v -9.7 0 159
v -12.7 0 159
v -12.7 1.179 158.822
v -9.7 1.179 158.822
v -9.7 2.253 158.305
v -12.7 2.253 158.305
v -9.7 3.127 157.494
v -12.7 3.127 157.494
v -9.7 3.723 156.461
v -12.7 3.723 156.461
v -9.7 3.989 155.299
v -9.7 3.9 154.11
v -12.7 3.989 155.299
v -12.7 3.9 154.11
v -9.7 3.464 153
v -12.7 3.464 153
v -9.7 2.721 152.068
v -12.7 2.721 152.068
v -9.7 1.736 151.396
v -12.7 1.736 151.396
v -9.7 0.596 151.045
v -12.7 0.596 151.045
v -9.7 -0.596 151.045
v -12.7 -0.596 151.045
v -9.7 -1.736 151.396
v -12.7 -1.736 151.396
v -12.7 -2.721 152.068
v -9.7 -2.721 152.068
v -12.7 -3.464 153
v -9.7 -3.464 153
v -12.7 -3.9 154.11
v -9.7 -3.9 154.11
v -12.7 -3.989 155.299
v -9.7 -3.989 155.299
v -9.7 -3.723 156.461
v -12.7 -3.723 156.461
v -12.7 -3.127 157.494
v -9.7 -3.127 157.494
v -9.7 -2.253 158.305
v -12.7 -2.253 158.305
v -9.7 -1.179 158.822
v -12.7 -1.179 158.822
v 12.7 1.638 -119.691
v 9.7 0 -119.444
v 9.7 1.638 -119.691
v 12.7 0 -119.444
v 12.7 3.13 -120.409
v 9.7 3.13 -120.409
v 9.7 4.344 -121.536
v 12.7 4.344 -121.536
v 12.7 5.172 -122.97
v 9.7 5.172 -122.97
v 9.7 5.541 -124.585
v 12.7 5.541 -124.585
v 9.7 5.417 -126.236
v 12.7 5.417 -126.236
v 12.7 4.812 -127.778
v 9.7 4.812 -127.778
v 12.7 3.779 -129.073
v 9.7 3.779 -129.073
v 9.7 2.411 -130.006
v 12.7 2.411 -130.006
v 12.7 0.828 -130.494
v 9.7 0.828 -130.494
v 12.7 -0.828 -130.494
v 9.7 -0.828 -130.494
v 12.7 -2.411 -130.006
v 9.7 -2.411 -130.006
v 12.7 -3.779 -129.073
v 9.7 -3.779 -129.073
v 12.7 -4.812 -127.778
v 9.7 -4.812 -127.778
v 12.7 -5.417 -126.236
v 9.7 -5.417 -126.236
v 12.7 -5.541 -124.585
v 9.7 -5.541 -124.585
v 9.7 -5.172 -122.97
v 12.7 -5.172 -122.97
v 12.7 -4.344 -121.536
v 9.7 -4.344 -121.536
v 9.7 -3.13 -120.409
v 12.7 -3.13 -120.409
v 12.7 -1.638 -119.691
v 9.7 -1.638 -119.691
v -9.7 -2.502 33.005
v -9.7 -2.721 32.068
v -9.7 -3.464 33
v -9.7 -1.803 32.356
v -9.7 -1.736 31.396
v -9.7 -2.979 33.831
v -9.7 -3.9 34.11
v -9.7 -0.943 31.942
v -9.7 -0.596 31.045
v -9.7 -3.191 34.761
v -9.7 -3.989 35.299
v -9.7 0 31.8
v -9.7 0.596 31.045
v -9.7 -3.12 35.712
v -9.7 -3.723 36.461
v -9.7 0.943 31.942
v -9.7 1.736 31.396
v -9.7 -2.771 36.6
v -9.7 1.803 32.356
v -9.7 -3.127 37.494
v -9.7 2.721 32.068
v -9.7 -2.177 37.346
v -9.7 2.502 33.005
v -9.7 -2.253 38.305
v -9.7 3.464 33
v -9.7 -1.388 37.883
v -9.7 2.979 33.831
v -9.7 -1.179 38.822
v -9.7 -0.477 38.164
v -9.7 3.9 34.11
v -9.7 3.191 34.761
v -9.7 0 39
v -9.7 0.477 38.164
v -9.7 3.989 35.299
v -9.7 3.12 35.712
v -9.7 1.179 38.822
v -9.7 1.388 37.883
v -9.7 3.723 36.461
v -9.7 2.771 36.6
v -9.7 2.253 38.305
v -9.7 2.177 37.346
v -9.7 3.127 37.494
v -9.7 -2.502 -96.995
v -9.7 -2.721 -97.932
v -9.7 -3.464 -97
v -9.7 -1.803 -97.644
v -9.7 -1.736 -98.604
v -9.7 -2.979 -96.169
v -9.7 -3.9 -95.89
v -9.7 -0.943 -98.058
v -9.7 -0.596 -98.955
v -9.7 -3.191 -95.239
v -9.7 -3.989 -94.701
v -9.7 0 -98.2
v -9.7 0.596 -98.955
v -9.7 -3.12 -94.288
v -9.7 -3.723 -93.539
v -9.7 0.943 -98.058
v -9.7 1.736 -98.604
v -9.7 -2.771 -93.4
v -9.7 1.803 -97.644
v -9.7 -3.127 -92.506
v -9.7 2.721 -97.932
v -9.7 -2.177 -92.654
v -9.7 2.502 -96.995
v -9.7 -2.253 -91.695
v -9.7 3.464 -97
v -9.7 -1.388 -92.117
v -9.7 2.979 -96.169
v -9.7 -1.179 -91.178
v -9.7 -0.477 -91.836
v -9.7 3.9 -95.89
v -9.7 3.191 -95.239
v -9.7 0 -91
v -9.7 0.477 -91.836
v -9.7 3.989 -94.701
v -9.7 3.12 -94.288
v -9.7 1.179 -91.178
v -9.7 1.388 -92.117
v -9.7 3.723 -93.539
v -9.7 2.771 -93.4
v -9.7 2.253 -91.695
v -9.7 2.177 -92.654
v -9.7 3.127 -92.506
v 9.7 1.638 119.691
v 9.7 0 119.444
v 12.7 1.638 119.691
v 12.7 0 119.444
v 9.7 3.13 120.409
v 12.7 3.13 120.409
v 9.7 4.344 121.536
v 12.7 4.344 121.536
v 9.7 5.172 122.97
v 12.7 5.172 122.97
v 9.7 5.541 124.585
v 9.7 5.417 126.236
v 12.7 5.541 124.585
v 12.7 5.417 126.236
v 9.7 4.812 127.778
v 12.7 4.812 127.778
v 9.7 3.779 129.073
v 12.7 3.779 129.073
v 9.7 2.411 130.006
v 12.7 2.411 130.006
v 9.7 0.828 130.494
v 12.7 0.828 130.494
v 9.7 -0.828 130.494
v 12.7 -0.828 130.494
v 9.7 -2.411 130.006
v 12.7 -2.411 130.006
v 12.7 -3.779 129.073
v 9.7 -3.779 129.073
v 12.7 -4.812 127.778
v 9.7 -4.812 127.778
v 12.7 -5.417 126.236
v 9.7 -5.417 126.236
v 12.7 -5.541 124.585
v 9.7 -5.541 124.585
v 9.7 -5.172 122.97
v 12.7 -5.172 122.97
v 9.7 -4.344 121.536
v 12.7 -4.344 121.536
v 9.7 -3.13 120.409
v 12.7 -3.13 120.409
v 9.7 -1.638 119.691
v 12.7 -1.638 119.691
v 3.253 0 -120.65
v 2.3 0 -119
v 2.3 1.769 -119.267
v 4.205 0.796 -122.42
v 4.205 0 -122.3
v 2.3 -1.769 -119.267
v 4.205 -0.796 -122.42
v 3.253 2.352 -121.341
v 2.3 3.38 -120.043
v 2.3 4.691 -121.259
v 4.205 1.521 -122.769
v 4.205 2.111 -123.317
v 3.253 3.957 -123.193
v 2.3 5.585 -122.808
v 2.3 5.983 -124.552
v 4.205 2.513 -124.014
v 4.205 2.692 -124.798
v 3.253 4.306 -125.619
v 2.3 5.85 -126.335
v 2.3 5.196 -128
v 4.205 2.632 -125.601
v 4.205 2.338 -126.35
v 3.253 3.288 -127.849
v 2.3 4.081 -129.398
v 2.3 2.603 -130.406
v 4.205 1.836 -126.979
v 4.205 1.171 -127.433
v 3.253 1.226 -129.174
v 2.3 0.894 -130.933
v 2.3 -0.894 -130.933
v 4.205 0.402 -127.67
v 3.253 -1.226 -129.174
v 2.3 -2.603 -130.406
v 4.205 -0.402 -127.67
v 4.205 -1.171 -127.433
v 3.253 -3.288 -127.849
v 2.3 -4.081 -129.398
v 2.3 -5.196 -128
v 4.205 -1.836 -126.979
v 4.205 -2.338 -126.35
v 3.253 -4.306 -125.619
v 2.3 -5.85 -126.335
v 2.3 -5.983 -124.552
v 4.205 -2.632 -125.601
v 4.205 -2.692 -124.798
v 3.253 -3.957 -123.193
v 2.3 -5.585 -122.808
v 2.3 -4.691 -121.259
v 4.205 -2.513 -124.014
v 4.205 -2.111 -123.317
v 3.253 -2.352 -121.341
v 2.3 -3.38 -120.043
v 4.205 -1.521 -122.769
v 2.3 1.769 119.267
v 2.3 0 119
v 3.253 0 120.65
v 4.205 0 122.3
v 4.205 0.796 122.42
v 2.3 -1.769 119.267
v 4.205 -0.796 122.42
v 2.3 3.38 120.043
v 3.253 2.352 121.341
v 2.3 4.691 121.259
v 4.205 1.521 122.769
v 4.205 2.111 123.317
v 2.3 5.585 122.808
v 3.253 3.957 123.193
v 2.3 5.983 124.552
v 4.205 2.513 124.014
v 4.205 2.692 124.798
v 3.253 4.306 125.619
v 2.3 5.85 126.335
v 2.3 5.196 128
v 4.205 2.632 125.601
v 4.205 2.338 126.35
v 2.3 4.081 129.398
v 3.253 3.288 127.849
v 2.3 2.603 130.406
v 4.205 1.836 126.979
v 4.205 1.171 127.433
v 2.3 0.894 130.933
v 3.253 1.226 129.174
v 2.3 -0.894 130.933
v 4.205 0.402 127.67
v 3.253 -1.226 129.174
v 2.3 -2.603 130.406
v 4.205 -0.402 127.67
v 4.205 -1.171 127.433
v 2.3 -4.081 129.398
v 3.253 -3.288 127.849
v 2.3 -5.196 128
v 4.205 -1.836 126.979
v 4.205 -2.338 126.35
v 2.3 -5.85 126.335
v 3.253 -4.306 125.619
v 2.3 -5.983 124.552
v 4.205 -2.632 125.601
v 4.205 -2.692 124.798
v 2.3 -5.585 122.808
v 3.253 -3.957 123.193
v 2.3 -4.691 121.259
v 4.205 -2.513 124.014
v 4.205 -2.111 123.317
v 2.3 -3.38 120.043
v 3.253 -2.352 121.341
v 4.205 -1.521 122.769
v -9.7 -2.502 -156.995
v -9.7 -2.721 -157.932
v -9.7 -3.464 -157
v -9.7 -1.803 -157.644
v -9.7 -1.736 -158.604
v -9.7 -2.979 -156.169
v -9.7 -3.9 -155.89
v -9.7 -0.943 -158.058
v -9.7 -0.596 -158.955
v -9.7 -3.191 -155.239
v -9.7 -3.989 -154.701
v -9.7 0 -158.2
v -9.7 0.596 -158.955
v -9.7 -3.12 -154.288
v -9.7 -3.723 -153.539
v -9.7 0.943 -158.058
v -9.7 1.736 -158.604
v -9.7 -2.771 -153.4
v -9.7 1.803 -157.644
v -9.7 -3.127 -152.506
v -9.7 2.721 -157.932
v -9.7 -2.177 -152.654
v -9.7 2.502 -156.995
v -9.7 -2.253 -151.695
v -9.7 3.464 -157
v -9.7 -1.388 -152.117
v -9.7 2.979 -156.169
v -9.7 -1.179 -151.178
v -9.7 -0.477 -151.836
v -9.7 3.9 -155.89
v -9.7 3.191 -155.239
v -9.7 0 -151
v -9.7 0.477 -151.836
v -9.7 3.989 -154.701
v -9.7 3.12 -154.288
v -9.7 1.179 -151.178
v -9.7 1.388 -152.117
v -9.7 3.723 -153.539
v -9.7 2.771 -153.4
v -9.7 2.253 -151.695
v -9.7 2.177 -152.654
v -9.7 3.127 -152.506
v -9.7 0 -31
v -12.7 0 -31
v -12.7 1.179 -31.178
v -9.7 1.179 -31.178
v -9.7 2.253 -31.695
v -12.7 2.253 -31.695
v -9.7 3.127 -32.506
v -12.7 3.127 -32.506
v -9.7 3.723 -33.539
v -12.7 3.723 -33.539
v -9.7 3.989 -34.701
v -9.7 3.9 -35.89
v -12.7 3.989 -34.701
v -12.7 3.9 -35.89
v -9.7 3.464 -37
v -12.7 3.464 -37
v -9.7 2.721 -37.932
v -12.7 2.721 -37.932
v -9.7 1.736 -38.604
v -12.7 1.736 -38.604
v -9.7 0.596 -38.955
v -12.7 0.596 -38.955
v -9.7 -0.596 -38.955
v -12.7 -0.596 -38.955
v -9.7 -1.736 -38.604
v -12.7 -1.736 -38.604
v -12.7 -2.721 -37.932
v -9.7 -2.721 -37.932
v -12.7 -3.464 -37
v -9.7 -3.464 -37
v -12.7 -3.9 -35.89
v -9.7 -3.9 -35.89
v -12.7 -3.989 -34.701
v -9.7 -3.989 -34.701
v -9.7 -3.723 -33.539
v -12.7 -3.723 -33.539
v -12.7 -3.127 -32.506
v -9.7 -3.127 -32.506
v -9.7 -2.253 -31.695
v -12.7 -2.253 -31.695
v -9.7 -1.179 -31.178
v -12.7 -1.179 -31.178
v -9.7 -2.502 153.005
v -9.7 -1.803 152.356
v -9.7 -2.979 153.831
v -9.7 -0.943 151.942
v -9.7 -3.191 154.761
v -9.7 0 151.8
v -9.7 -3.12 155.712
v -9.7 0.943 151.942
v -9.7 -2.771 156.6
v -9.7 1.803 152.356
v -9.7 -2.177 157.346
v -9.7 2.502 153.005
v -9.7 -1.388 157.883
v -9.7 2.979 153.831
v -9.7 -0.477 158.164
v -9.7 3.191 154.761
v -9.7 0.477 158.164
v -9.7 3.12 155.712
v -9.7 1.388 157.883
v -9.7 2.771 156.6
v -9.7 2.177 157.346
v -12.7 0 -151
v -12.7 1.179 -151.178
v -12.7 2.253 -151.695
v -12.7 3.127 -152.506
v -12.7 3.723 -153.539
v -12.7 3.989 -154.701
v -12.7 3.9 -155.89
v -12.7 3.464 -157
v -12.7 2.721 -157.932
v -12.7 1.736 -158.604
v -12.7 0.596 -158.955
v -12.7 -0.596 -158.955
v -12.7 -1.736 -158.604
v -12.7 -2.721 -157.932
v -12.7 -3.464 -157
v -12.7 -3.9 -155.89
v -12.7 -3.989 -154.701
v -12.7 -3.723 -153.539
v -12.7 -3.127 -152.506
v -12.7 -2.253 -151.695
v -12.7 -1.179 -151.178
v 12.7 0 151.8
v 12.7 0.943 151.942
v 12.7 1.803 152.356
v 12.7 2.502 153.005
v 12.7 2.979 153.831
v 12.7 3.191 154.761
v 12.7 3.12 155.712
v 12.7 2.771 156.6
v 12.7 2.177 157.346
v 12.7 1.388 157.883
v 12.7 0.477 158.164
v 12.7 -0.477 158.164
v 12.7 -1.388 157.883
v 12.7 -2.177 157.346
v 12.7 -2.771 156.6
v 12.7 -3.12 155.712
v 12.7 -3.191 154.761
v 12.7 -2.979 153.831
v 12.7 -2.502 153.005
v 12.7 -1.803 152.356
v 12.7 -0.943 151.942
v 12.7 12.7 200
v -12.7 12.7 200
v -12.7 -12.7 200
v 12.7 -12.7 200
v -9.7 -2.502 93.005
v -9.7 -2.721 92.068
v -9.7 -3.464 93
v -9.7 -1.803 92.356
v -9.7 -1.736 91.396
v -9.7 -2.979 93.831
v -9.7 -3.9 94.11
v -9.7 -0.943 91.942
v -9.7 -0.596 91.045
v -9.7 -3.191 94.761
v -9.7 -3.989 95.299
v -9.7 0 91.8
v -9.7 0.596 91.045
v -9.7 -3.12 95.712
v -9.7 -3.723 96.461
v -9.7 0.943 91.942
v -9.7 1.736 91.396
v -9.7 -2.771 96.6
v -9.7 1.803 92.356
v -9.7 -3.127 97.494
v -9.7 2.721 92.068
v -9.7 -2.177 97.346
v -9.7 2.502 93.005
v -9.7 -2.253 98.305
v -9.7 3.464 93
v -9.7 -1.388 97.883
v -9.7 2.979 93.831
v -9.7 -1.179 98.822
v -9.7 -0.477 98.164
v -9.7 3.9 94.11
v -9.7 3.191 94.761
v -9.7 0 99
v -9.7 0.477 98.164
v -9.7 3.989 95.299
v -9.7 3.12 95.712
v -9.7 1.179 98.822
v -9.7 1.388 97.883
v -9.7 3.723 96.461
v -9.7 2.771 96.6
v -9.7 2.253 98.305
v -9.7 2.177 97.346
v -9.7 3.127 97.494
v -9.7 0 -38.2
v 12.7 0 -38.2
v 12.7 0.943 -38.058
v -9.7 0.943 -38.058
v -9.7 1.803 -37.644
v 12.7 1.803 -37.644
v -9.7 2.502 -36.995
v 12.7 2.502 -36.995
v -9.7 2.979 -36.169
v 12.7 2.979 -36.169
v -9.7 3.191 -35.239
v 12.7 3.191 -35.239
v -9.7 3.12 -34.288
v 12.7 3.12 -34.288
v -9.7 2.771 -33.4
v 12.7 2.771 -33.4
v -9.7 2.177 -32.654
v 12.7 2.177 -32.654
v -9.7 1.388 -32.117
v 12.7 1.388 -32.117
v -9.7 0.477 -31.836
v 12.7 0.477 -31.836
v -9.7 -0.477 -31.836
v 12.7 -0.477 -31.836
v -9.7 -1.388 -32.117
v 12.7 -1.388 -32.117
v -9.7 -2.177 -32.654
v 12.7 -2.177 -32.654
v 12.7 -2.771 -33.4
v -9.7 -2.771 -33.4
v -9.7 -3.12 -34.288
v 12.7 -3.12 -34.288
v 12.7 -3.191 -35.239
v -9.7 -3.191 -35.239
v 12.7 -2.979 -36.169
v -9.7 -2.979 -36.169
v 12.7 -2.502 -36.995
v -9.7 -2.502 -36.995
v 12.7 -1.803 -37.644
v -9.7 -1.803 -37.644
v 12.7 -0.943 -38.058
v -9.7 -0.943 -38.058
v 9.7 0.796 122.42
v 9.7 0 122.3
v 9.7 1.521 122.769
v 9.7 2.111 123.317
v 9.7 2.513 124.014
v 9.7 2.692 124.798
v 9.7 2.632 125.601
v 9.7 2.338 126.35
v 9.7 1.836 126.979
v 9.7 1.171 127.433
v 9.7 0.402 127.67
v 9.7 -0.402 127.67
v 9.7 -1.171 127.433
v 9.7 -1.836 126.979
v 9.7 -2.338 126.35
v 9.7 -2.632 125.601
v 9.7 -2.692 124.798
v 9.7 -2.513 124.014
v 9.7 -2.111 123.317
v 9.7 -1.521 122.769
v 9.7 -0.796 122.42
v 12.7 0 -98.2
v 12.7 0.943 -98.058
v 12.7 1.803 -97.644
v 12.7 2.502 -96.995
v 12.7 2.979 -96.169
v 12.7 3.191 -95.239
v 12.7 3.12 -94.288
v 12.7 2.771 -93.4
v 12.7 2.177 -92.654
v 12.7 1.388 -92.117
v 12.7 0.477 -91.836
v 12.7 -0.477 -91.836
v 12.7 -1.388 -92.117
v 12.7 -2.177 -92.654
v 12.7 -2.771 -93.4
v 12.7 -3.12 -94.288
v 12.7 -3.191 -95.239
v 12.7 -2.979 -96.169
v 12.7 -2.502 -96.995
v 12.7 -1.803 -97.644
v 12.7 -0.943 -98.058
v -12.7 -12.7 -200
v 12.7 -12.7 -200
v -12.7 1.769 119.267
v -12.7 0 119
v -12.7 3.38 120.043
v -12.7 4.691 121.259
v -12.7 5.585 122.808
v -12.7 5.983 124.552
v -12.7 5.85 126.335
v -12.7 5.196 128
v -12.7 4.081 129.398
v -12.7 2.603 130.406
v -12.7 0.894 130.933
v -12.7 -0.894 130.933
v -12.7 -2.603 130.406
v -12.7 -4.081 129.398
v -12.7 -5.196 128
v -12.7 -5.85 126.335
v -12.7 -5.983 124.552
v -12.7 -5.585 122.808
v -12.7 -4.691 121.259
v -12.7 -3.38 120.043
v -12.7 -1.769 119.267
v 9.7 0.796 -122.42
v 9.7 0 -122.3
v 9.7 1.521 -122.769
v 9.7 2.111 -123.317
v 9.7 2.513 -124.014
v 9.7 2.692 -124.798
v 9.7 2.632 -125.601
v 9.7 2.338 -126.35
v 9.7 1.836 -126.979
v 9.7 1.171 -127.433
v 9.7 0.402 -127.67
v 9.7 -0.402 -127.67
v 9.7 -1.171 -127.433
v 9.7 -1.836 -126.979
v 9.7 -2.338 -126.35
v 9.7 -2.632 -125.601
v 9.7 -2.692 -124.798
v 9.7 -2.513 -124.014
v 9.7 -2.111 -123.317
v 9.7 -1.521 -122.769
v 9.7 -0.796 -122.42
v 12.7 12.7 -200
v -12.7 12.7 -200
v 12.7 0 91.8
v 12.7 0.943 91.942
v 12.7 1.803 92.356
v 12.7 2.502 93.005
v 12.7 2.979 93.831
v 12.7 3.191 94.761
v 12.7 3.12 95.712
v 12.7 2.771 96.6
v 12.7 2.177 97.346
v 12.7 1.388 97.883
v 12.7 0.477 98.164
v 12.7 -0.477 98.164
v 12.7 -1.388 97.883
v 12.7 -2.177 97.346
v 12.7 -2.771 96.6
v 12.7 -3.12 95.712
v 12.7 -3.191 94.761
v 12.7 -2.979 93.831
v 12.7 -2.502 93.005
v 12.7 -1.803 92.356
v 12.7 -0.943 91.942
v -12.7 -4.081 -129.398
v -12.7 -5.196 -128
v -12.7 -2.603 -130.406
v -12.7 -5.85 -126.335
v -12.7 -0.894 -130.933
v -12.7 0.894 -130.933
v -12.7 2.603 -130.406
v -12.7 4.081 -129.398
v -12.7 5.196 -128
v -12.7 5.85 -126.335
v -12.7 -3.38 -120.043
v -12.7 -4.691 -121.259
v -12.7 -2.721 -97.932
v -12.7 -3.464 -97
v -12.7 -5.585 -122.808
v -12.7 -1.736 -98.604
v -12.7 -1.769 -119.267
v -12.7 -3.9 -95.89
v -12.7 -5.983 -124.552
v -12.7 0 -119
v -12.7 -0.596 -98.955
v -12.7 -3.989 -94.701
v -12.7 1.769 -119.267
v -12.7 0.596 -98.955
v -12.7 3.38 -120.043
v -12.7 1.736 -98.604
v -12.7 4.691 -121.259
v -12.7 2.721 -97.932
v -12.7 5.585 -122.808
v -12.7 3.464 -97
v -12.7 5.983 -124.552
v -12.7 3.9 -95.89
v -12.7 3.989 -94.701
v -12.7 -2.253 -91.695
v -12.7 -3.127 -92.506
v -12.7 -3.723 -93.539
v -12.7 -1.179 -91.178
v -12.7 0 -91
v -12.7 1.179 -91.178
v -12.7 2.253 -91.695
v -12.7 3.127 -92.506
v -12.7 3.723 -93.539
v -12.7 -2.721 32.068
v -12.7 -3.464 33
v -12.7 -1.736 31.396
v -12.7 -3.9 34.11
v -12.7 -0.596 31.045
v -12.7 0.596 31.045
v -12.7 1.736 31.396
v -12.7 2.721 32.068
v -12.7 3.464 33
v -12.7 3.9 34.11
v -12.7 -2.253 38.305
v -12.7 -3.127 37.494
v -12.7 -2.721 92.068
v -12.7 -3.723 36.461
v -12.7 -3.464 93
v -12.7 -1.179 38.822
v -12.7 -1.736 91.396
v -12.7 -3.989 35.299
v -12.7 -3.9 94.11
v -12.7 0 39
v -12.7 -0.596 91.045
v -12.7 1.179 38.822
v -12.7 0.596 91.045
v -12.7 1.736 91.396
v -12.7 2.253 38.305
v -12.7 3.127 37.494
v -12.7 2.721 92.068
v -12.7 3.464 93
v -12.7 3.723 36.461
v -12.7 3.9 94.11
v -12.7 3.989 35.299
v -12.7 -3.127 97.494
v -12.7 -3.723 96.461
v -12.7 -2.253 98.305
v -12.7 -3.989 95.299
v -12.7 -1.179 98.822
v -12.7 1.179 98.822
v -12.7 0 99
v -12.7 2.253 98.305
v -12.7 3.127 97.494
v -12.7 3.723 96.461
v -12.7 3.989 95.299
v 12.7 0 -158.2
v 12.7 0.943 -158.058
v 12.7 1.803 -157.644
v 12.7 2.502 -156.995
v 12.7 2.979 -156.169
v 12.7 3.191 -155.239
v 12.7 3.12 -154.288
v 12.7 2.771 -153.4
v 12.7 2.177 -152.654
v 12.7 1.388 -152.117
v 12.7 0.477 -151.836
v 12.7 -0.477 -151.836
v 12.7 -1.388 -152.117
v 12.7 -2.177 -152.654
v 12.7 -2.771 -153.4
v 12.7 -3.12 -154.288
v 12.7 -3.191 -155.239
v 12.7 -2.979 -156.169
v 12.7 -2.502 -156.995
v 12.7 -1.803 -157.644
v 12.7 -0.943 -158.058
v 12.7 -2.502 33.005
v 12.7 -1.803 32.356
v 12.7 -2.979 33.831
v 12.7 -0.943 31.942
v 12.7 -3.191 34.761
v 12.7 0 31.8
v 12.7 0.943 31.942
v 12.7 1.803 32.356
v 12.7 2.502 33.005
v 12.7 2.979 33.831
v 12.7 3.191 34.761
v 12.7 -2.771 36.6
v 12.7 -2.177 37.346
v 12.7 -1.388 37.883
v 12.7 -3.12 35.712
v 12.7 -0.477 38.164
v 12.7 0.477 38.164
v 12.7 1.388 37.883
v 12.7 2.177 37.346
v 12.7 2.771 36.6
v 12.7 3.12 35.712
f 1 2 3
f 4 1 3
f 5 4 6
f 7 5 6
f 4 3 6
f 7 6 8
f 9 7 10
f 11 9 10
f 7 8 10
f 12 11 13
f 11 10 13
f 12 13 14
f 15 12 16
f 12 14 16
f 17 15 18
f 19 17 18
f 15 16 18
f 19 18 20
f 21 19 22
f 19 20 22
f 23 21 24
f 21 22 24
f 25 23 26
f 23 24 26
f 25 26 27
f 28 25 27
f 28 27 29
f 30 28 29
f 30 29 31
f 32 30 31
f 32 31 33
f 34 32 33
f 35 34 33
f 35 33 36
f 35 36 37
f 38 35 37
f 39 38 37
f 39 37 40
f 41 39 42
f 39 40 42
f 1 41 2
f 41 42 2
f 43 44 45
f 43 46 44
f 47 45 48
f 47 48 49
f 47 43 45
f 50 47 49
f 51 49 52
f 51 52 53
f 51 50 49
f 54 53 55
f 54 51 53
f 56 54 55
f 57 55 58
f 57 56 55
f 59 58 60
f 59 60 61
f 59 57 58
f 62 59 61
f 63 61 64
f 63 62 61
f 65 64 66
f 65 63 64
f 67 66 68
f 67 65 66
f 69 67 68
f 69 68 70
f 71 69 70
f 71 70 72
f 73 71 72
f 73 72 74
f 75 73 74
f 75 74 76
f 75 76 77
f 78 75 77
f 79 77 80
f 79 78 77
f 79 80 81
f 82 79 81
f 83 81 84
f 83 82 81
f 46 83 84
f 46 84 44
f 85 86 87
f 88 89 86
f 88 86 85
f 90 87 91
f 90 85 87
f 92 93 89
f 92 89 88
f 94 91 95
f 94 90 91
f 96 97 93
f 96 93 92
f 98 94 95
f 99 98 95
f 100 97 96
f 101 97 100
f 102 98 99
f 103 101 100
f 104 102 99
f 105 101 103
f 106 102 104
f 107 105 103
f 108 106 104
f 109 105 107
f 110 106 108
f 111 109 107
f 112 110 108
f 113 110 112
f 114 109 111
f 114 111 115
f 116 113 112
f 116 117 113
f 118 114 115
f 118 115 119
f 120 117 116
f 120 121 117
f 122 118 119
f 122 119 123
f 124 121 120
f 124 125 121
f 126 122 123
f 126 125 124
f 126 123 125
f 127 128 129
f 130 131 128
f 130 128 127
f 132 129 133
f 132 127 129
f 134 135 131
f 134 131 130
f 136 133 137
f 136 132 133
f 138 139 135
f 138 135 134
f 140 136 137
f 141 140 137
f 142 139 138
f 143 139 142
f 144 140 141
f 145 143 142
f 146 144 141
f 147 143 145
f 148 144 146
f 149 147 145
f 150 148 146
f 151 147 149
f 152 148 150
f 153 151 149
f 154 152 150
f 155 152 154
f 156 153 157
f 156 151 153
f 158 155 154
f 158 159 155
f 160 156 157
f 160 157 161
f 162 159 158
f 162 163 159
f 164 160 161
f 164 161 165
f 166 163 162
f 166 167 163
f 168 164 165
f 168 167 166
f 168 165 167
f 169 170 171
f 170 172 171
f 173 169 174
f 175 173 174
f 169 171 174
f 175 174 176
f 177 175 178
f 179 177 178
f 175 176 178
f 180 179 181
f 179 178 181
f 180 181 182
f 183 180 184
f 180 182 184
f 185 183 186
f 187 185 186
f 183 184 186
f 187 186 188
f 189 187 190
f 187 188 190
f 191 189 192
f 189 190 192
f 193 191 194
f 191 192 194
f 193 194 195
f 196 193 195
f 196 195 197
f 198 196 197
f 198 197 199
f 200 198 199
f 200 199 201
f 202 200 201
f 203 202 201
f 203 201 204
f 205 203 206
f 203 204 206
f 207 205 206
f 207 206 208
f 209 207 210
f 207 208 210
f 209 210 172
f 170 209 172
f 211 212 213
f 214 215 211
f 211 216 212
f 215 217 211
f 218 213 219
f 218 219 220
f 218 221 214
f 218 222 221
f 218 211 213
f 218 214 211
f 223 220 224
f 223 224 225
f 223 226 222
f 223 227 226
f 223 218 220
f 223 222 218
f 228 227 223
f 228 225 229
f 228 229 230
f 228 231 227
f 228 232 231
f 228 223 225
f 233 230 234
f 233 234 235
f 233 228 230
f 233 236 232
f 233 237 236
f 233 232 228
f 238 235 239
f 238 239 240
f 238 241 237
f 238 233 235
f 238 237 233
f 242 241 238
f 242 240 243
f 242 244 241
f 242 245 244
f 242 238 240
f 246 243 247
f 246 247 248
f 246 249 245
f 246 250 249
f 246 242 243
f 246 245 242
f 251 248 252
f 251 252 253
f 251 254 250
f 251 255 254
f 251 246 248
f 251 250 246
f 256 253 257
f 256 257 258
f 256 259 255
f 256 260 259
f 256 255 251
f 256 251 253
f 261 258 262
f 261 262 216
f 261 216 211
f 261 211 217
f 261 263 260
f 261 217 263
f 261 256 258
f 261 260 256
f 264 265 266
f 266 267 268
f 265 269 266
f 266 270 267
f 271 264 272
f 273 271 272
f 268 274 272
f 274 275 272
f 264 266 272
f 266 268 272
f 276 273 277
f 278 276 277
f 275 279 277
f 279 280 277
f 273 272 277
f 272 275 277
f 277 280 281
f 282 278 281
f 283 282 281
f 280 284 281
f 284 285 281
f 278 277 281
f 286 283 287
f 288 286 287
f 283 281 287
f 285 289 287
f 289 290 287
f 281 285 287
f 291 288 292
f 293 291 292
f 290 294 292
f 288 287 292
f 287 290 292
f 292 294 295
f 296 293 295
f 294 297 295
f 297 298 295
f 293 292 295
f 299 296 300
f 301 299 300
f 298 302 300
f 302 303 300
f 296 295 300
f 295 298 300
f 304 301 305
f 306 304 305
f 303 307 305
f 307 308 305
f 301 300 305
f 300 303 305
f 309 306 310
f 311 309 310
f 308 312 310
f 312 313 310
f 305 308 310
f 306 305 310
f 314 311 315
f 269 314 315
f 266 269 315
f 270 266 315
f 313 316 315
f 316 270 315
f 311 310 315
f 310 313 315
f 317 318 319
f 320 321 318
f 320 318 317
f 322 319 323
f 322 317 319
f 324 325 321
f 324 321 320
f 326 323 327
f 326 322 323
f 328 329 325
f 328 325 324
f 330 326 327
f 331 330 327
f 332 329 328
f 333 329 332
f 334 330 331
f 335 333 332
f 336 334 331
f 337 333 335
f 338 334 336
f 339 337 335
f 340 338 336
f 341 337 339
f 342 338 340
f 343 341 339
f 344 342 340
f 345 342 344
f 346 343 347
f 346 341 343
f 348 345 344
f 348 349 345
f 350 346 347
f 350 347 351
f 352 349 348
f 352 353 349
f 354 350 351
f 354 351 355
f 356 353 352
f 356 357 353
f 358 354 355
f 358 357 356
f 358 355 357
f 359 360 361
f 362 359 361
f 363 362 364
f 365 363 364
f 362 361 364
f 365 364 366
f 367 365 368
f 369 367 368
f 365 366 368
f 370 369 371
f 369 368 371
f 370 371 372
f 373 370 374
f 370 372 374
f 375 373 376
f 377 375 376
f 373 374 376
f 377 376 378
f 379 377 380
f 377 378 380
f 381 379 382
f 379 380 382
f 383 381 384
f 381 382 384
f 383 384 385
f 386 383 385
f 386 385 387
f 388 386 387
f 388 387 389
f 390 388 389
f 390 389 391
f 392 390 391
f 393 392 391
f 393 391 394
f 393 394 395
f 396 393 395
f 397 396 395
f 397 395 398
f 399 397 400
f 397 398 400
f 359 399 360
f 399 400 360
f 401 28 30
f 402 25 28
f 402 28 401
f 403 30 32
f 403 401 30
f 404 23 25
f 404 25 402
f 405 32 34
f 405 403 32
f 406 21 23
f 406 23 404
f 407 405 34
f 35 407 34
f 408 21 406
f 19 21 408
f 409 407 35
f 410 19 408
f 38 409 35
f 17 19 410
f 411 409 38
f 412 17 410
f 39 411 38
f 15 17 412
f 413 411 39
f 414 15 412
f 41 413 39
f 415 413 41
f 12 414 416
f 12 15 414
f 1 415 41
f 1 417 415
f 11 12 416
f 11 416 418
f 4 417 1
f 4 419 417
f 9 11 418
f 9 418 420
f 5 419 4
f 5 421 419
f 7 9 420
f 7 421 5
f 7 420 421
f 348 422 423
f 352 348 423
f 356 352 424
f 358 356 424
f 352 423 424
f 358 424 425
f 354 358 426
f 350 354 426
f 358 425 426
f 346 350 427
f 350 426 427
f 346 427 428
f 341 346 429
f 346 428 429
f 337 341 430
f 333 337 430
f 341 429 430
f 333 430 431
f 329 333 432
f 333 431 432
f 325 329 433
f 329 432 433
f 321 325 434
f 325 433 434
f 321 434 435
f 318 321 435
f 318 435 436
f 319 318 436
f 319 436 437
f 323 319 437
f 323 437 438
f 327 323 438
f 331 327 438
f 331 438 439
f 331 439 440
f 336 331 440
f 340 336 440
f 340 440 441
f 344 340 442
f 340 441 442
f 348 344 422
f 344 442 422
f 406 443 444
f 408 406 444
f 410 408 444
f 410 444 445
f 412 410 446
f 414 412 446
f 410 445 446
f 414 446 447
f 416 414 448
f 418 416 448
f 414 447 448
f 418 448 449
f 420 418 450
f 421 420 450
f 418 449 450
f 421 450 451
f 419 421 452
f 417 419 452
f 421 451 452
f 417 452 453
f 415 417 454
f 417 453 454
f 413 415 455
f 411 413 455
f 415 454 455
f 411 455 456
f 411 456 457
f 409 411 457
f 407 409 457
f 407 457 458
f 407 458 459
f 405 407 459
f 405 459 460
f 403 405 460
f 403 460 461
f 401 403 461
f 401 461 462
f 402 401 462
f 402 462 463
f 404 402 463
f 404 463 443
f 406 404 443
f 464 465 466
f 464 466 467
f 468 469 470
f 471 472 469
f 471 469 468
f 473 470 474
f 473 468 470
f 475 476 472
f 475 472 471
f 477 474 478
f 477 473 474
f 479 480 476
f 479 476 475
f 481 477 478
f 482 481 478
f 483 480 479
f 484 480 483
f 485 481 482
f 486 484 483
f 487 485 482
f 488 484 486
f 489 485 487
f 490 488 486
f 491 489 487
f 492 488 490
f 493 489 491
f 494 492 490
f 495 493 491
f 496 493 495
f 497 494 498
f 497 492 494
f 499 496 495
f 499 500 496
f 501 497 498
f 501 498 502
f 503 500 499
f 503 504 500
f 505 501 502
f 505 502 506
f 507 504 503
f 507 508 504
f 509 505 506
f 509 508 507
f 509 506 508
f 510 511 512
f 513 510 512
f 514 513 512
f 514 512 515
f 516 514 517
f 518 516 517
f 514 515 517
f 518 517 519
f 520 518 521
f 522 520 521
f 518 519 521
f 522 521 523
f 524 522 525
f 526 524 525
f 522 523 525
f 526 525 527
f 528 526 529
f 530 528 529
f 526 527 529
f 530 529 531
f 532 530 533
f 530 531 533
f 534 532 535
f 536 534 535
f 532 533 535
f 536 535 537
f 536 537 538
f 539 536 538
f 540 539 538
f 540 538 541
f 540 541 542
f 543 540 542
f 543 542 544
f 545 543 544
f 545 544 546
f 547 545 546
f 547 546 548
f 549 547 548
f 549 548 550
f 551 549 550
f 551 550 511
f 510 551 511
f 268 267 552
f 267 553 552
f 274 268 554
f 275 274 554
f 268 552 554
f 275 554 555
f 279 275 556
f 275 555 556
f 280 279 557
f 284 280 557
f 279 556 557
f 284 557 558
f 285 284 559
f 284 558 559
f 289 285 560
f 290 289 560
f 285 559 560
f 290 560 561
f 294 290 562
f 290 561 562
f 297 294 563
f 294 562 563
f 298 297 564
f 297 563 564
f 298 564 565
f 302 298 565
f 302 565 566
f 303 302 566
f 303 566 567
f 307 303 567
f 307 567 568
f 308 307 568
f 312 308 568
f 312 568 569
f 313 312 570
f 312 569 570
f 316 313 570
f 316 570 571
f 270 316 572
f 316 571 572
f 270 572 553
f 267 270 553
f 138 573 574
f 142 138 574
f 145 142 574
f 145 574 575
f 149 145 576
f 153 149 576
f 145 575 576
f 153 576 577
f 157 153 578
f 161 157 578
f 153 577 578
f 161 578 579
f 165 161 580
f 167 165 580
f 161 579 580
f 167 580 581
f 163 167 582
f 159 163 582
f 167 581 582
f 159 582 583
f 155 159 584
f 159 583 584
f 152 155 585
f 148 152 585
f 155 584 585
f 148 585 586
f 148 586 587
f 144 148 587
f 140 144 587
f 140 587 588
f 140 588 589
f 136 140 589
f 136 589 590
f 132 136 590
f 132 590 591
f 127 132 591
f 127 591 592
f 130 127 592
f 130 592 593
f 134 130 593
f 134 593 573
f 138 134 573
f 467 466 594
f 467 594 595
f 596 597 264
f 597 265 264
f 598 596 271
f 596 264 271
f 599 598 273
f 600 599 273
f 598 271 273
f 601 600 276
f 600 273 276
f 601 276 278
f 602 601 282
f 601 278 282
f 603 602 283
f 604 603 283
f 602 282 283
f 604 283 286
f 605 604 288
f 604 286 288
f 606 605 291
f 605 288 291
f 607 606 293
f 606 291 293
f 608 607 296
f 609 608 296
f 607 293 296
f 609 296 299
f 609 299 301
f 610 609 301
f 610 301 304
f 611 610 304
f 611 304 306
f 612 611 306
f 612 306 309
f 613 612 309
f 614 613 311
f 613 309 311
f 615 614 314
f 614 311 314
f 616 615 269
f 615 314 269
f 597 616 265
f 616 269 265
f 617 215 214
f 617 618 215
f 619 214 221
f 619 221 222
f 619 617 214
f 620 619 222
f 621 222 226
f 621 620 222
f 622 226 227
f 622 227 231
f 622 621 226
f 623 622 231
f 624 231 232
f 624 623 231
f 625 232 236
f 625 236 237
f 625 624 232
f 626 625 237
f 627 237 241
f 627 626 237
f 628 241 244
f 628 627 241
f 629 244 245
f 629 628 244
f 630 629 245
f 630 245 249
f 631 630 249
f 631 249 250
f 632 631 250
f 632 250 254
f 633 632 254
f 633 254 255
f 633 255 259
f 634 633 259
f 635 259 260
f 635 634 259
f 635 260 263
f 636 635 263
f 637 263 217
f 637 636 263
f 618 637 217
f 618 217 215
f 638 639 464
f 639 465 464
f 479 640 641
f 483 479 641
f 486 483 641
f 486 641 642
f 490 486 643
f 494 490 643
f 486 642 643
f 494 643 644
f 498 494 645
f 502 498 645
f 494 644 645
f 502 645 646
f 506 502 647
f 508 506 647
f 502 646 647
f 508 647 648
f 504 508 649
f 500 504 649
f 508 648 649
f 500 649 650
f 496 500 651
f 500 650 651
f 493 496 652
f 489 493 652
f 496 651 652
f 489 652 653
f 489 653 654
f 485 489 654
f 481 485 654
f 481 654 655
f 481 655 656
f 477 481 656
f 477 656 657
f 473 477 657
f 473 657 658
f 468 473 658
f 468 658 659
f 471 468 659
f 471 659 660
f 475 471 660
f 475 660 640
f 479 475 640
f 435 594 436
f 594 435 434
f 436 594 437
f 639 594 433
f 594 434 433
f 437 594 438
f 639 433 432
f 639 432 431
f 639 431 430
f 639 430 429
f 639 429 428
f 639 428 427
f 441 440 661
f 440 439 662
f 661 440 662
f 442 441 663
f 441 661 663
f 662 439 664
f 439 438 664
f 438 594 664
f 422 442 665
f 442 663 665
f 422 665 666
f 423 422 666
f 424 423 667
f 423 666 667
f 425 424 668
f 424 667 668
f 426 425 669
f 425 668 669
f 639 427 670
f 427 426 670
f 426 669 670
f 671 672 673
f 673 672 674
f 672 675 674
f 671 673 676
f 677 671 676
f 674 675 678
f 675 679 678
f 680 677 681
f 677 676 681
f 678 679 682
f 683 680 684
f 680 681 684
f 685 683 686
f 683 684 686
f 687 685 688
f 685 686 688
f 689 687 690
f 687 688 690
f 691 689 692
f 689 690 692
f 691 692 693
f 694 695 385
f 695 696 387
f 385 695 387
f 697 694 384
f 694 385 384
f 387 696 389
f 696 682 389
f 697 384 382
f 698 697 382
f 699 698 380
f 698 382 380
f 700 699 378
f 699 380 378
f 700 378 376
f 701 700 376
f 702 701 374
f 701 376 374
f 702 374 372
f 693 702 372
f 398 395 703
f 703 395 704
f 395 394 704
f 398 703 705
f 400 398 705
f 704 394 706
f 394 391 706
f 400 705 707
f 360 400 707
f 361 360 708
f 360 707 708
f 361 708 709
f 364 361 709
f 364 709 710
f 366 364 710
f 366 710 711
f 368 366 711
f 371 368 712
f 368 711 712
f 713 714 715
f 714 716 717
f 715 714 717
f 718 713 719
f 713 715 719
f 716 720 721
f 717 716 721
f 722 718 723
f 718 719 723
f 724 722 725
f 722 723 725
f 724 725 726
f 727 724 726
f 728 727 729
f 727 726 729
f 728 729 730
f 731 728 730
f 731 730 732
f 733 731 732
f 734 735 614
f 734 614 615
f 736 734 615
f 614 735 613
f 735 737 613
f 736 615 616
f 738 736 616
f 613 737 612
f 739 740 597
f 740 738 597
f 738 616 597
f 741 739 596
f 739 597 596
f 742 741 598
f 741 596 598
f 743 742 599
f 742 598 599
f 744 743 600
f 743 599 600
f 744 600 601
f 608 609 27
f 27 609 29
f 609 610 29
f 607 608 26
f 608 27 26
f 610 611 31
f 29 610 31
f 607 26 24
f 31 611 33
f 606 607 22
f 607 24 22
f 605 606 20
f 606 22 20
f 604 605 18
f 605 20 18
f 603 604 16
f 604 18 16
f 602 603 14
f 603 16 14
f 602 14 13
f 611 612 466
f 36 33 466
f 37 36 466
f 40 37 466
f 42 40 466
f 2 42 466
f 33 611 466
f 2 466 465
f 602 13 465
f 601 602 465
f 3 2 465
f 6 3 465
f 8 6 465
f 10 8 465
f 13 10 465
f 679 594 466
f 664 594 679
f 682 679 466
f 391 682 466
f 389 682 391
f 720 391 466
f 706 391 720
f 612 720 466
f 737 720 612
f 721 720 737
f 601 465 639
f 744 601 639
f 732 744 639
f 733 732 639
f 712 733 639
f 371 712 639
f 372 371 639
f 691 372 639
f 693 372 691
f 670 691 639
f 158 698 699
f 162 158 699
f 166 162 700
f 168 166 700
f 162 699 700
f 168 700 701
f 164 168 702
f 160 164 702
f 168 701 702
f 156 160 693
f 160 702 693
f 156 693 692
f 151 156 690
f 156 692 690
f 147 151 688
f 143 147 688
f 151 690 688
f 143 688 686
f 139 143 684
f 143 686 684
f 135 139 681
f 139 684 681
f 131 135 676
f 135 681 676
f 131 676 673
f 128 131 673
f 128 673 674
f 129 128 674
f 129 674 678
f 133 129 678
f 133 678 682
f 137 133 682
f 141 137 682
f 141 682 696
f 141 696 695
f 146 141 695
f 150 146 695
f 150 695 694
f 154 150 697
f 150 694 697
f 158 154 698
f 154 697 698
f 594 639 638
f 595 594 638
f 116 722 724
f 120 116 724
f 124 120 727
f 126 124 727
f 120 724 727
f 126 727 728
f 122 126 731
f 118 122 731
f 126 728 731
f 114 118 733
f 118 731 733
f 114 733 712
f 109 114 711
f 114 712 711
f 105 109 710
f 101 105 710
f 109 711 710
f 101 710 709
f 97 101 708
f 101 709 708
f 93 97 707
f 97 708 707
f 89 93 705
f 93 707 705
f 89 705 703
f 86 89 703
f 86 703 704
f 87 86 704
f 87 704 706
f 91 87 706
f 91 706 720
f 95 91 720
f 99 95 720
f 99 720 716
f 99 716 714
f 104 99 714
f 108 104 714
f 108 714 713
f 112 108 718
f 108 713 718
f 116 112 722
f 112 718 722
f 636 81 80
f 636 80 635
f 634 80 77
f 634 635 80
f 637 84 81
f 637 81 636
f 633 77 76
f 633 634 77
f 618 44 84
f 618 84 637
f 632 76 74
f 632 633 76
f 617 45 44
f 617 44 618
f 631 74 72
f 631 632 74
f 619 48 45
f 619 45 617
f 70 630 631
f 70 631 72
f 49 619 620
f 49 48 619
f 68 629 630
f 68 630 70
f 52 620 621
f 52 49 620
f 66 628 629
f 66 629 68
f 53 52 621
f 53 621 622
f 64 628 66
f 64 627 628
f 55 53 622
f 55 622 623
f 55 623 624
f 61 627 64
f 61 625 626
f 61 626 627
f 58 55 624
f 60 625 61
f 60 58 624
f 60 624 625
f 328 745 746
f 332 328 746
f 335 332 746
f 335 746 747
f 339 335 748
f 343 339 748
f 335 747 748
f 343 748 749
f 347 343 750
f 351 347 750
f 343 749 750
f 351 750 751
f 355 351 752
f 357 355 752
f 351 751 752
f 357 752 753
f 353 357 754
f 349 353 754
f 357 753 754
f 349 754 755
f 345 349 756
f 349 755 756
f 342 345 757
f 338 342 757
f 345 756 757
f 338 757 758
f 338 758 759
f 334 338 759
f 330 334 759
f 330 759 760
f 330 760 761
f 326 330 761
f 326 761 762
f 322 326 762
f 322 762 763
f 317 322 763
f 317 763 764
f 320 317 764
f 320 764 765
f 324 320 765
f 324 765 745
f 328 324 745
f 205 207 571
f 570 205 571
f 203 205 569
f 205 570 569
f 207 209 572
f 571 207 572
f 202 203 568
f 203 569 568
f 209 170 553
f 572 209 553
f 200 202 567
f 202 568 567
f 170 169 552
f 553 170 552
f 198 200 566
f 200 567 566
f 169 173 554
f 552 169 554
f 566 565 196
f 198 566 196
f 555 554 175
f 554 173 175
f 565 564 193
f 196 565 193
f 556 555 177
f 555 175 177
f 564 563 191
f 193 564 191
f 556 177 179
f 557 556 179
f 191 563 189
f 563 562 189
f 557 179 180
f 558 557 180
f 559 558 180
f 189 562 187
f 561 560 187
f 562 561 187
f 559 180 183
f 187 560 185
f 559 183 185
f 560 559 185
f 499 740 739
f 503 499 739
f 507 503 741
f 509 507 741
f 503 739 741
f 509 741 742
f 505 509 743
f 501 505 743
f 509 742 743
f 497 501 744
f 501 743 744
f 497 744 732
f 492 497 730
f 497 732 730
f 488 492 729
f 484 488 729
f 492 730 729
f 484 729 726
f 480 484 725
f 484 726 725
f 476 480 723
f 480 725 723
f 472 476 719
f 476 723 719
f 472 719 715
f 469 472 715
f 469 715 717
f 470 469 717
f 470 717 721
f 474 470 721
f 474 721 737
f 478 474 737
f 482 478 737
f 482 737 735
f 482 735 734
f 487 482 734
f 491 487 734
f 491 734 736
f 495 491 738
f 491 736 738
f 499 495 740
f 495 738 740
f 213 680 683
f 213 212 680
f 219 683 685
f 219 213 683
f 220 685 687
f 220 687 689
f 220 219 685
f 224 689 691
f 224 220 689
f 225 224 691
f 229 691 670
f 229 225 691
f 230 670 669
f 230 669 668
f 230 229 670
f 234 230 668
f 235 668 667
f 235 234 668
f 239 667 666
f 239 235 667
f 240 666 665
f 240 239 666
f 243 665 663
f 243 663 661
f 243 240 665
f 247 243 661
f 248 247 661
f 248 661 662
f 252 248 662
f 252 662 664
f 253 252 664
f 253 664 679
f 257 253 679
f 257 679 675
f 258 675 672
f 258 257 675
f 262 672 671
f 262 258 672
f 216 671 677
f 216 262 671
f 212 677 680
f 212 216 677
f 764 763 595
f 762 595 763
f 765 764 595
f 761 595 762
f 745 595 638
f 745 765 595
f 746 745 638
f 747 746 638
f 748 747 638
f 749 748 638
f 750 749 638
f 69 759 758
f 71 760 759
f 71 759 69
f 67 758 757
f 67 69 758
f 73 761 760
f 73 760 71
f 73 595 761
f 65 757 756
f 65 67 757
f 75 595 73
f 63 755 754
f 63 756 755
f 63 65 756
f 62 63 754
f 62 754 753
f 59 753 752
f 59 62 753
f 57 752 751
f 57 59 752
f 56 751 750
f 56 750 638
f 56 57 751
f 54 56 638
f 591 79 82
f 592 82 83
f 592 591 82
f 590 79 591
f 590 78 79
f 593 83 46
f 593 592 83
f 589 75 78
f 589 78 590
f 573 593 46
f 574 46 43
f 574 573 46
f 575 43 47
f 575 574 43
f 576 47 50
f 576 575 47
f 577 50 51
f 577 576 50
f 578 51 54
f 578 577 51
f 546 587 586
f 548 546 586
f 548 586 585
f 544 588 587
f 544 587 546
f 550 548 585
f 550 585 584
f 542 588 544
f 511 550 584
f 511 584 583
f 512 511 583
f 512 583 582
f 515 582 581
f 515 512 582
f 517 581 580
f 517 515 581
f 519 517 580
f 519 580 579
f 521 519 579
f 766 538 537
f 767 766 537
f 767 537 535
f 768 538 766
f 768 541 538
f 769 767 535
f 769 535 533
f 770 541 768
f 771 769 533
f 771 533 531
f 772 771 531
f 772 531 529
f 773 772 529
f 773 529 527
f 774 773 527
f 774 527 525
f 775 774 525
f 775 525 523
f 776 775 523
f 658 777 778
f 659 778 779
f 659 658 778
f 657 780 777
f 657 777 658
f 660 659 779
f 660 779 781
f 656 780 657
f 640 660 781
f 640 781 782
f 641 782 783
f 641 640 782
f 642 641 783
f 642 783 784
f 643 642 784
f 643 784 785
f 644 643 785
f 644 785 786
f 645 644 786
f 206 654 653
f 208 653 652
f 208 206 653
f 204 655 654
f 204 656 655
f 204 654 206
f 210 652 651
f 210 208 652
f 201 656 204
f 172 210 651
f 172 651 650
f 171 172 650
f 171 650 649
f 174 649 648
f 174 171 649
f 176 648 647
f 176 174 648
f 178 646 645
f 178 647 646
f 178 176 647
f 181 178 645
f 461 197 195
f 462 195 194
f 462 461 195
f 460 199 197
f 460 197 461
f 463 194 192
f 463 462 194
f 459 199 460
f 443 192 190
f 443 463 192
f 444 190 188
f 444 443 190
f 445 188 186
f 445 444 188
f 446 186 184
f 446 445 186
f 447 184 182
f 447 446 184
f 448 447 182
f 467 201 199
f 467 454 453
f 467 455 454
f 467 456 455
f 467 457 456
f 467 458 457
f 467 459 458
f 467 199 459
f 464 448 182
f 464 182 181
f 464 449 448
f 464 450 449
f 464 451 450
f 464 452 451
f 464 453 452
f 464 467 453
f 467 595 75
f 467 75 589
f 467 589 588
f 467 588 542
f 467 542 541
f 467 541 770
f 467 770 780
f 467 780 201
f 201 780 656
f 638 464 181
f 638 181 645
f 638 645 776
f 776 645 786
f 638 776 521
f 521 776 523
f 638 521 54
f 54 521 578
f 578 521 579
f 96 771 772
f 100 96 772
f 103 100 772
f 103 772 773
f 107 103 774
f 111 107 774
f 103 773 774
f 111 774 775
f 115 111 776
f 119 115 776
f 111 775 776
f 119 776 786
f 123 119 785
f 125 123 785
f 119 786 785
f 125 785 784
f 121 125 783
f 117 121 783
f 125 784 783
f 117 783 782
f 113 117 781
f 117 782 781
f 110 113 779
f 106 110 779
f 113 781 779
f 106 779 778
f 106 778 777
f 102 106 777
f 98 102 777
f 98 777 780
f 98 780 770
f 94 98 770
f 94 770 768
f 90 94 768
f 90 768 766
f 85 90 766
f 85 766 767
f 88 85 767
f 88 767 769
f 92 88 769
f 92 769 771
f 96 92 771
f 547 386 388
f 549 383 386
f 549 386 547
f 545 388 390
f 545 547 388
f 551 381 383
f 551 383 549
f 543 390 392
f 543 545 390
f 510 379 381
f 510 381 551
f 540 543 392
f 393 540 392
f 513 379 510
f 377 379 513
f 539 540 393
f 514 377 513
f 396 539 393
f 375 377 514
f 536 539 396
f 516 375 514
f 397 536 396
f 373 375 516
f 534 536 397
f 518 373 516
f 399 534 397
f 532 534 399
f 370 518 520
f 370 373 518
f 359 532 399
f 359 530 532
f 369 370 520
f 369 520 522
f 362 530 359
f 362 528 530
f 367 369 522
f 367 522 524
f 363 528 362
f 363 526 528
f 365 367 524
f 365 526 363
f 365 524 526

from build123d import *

# Parameters (mm, degrees)
BOSS_EXTRUDE1_DEPTH      = 200
BOSS_EXTRUDE1_DEPTH_BACK = 200
SKETCH1_W                = 25.4
SKETCH1_H                = 25.4
SKETCH5_R                = 3.2
CUT_EXTRUDE1_DEPTH       = 203.006064265
SKETCH6_R                = 4
CUT_EXTRUDE2_DEPTH       = 3


with BuildPart() as part:
    # Sketch1 → Boss-Extrude1 (new, two sides: drawn at the far end of the back side and taken through both)
    with BuildSketch(Plane.XY.offset(-BOSS_EXTRUDE1_DEPTH_BACK)):
        Rectangle(SKETCH1_W, SKETCH1_H)
    extrude(amount=BOSS_EXTRUDE1_DEPTH + BOSS_EXTRUDE1_DEPTH_BACK)

    # Sketch5 → Cut-Extrude1 (cut, through all)
    with BuildSketch(Plane(origin=(12.7, 0, 0), x_dir=(0, 0, -1), z_dir=(1, 0, 0))):
        with Locations((-155, 0)):
            Circle(SKETCH5_R)
        with Locations((-95, 0)):
            Circle(SKETCH5_R)
        with Locations((-35, 0)):
            Circle(SKETCH5_R)
        with Locations((35, 0)):
            Circle(SKETCH5_R)
        with Locations((95, 0)):
            Circle(SKETCH5_R)
        with Locations((155, 0)):
            Circle(SKETCH5_R)
    extrude(amount=-CUT_EXTRUDE1_DEPTH, mode=Mode.SUBTRACT)

    # Sketch6 → Cut-Extrude2 (cut)
    with BuildSketch(Plane.ZY.offset(12.7)):
        with Locations((-155, 0)):
            Circle(SKETCH6_R)
        with Locations((-95, 0)):
            Circle(SKETCH6_R)
        with Locations((-35, 0)):
            Circle(SKETCH6_R)
        with Locations((35, 0)):
            Circle(SKETCH6_R)
        with Locations((95, 0)):
            Circle(SKETCH6_R)
        with Locations((155, 0)):
            Circle(SKETCH6_R)
    extrude(amount=-CUT_EXTRUDE2_DEPTH, mode=Mode.SUBTRACT)

    # Sketch7 → Cut-Revolve1 (revolve, cut)
    with BuildSketch(Plane(origin=(0, 0, 0), x_dir=(1, 0, 0), z_dir=(0, 1, 0))):
        Polygon((-12.7, 125), (-12.7, 119), (2.3, 119), (4.205255888, 122.3), (9.7, 122.3), (9.7, 119.44375), (12.7, 119.44375), (12.7, 125), align=None)
    cut_revolve1 = revolve(axis=Axis((12.7, 0, -125), (-1, 0, 0)), mode=Mode.SUBTRACT)

    # Mirror1: Cut-Revolve1 across plane
    add(cut_revolve1.mirror(Plane.XY), mode=Mode.SUBTRACT)


solid = part.part
